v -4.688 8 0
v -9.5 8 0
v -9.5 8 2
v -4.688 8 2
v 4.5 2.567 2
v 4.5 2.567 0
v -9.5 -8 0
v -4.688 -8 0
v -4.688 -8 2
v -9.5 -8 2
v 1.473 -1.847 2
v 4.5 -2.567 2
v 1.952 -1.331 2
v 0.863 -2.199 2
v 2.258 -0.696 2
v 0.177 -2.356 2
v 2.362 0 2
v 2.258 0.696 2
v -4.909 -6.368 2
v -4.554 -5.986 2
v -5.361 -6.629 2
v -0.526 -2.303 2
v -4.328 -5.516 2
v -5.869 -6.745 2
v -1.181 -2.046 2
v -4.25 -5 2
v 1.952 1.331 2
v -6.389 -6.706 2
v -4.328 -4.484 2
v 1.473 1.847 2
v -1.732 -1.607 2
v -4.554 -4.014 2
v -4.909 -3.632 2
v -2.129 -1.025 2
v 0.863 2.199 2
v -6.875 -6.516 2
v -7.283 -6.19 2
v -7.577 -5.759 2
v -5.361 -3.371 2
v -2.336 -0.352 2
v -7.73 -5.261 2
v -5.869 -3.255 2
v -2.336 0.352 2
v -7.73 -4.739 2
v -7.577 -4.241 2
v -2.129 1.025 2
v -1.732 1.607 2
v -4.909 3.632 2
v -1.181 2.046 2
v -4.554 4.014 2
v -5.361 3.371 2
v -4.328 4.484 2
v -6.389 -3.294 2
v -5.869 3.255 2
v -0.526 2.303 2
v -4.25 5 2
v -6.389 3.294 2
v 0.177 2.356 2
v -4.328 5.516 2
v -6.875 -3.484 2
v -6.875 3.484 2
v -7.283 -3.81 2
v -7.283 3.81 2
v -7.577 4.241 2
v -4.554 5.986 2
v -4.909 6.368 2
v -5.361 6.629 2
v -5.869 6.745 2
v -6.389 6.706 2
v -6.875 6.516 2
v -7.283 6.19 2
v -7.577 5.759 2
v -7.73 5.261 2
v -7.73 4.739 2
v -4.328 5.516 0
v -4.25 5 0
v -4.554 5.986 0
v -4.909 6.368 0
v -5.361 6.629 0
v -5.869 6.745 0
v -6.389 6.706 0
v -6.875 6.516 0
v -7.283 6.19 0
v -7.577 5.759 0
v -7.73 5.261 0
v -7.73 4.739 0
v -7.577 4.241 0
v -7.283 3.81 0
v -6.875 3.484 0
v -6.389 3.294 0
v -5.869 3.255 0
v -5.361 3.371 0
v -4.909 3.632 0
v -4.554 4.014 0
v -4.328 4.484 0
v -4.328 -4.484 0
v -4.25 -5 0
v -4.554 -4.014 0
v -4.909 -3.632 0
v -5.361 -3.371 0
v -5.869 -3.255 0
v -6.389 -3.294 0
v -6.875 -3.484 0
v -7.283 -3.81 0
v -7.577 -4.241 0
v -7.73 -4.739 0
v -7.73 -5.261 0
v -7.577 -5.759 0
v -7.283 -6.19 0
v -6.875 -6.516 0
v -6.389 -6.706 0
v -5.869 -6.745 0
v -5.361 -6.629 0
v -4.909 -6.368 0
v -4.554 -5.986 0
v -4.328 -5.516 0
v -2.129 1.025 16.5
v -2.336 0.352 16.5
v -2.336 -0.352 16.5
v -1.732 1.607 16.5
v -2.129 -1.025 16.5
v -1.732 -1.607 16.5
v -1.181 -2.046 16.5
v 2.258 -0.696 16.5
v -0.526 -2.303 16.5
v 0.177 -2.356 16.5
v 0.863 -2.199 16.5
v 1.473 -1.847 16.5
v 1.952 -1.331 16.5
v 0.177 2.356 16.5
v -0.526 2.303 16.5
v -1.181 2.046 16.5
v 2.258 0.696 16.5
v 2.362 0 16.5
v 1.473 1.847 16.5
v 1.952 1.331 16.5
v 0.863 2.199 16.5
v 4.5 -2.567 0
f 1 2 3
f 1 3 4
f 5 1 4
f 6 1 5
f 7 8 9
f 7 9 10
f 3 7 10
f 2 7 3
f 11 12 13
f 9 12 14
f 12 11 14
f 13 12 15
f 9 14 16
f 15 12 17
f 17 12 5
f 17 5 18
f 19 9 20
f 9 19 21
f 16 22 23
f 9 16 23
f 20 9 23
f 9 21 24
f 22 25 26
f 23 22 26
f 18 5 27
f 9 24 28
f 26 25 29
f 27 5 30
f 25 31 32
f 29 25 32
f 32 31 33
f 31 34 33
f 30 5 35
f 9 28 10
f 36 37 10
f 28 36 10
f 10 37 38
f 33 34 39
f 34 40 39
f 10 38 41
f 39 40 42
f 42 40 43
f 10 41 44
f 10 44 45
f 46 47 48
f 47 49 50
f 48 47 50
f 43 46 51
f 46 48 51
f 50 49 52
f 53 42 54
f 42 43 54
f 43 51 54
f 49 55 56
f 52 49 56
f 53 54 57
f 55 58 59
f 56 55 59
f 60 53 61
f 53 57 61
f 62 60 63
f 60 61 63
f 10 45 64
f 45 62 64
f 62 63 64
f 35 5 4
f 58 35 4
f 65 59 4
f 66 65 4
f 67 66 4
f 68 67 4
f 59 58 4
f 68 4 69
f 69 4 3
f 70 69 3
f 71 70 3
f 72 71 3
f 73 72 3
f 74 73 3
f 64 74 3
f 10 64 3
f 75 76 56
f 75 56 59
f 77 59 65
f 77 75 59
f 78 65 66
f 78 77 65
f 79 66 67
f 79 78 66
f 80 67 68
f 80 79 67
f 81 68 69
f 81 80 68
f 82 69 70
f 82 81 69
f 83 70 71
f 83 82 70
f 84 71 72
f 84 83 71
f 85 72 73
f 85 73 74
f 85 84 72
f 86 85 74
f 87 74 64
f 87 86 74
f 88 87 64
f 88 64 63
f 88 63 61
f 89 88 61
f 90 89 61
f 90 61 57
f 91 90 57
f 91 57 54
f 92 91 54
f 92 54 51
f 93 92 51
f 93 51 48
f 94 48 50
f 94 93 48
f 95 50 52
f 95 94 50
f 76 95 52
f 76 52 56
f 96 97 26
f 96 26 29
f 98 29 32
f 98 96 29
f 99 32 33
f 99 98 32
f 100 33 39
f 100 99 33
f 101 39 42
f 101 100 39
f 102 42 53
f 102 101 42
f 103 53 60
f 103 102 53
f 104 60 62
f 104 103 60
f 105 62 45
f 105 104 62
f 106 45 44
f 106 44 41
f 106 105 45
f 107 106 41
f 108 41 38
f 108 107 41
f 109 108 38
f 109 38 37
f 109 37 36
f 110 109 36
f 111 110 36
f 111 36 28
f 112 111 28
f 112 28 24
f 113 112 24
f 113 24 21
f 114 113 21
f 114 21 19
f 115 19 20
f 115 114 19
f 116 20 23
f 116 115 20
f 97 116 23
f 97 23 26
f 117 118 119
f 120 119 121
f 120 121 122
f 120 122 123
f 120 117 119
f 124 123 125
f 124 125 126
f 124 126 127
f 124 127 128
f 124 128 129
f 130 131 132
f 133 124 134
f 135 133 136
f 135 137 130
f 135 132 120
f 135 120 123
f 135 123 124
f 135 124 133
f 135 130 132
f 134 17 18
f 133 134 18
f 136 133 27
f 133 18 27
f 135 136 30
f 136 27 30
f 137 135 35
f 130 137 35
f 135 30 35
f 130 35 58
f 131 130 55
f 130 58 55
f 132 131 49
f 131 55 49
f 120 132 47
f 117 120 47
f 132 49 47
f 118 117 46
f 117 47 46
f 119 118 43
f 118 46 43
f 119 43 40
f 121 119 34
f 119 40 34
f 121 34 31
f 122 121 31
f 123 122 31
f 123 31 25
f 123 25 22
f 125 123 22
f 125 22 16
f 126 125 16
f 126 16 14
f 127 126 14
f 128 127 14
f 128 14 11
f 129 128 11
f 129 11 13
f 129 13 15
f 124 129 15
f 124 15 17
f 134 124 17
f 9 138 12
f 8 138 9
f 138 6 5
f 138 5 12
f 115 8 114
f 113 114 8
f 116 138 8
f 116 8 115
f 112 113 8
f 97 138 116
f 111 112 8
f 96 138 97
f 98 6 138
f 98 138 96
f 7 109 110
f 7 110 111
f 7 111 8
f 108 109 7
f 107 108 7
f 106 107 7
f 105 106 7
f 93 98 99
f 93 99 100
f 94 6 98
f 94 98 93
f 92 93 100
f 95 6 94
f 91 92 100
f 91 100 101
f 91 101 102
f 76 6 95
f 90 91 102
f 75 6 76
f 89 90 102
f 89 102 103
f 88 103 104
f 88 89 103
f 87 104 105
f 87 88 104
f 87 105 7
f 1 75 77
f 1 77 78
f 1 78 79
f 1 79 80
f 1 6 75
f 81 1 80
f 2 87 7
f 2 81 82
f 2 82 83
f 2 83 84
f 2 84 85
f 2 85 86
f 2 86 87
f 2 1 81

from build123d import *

# Parameters (mm, degrees)
SKETCH1_R           = 1.75
SKETCH1_R_2         = 2.3625
BOSS_EXTRUDE1_DEPTH = 2
SKETCH1_2_R         = 2.3625
BOSS_EXTRUDE2_DEPTH = 16.5


with BuildPart() as part:
    # Sketch1 → Boss-Extrude1 (new body)
    with BuildSketch(Plane.XY):
        Polygon((-9.5, -8), (-9.5, 8), (-4.688228281, 8), (4.5, 2.566962921), (4.5, -2.566962921), (-4.688228281, -8), align=None)
        with Locations((-6, -5)):
            Circle(SKETCH1_R, mode=Mode.SUBTRACT)
        with Locations((-6, 5)):
            Circle(SKETCH1_R, mode=Mode.SUBTRACT)
        Circle(SKETCH1_R_2, mode=Mode.SUBTRACT)
    extrude(amount=BOSS_EXTRUDE1_DEPTH)

    # Sketch1<2> → Boss-Extrude2 (add)
    with BuildSketch(Plane.XY):
        Circle(SKETCH1_2_R)
    extrude(amount=BOSS_EXTRUDE2_DEPTH)


solid = part.part
